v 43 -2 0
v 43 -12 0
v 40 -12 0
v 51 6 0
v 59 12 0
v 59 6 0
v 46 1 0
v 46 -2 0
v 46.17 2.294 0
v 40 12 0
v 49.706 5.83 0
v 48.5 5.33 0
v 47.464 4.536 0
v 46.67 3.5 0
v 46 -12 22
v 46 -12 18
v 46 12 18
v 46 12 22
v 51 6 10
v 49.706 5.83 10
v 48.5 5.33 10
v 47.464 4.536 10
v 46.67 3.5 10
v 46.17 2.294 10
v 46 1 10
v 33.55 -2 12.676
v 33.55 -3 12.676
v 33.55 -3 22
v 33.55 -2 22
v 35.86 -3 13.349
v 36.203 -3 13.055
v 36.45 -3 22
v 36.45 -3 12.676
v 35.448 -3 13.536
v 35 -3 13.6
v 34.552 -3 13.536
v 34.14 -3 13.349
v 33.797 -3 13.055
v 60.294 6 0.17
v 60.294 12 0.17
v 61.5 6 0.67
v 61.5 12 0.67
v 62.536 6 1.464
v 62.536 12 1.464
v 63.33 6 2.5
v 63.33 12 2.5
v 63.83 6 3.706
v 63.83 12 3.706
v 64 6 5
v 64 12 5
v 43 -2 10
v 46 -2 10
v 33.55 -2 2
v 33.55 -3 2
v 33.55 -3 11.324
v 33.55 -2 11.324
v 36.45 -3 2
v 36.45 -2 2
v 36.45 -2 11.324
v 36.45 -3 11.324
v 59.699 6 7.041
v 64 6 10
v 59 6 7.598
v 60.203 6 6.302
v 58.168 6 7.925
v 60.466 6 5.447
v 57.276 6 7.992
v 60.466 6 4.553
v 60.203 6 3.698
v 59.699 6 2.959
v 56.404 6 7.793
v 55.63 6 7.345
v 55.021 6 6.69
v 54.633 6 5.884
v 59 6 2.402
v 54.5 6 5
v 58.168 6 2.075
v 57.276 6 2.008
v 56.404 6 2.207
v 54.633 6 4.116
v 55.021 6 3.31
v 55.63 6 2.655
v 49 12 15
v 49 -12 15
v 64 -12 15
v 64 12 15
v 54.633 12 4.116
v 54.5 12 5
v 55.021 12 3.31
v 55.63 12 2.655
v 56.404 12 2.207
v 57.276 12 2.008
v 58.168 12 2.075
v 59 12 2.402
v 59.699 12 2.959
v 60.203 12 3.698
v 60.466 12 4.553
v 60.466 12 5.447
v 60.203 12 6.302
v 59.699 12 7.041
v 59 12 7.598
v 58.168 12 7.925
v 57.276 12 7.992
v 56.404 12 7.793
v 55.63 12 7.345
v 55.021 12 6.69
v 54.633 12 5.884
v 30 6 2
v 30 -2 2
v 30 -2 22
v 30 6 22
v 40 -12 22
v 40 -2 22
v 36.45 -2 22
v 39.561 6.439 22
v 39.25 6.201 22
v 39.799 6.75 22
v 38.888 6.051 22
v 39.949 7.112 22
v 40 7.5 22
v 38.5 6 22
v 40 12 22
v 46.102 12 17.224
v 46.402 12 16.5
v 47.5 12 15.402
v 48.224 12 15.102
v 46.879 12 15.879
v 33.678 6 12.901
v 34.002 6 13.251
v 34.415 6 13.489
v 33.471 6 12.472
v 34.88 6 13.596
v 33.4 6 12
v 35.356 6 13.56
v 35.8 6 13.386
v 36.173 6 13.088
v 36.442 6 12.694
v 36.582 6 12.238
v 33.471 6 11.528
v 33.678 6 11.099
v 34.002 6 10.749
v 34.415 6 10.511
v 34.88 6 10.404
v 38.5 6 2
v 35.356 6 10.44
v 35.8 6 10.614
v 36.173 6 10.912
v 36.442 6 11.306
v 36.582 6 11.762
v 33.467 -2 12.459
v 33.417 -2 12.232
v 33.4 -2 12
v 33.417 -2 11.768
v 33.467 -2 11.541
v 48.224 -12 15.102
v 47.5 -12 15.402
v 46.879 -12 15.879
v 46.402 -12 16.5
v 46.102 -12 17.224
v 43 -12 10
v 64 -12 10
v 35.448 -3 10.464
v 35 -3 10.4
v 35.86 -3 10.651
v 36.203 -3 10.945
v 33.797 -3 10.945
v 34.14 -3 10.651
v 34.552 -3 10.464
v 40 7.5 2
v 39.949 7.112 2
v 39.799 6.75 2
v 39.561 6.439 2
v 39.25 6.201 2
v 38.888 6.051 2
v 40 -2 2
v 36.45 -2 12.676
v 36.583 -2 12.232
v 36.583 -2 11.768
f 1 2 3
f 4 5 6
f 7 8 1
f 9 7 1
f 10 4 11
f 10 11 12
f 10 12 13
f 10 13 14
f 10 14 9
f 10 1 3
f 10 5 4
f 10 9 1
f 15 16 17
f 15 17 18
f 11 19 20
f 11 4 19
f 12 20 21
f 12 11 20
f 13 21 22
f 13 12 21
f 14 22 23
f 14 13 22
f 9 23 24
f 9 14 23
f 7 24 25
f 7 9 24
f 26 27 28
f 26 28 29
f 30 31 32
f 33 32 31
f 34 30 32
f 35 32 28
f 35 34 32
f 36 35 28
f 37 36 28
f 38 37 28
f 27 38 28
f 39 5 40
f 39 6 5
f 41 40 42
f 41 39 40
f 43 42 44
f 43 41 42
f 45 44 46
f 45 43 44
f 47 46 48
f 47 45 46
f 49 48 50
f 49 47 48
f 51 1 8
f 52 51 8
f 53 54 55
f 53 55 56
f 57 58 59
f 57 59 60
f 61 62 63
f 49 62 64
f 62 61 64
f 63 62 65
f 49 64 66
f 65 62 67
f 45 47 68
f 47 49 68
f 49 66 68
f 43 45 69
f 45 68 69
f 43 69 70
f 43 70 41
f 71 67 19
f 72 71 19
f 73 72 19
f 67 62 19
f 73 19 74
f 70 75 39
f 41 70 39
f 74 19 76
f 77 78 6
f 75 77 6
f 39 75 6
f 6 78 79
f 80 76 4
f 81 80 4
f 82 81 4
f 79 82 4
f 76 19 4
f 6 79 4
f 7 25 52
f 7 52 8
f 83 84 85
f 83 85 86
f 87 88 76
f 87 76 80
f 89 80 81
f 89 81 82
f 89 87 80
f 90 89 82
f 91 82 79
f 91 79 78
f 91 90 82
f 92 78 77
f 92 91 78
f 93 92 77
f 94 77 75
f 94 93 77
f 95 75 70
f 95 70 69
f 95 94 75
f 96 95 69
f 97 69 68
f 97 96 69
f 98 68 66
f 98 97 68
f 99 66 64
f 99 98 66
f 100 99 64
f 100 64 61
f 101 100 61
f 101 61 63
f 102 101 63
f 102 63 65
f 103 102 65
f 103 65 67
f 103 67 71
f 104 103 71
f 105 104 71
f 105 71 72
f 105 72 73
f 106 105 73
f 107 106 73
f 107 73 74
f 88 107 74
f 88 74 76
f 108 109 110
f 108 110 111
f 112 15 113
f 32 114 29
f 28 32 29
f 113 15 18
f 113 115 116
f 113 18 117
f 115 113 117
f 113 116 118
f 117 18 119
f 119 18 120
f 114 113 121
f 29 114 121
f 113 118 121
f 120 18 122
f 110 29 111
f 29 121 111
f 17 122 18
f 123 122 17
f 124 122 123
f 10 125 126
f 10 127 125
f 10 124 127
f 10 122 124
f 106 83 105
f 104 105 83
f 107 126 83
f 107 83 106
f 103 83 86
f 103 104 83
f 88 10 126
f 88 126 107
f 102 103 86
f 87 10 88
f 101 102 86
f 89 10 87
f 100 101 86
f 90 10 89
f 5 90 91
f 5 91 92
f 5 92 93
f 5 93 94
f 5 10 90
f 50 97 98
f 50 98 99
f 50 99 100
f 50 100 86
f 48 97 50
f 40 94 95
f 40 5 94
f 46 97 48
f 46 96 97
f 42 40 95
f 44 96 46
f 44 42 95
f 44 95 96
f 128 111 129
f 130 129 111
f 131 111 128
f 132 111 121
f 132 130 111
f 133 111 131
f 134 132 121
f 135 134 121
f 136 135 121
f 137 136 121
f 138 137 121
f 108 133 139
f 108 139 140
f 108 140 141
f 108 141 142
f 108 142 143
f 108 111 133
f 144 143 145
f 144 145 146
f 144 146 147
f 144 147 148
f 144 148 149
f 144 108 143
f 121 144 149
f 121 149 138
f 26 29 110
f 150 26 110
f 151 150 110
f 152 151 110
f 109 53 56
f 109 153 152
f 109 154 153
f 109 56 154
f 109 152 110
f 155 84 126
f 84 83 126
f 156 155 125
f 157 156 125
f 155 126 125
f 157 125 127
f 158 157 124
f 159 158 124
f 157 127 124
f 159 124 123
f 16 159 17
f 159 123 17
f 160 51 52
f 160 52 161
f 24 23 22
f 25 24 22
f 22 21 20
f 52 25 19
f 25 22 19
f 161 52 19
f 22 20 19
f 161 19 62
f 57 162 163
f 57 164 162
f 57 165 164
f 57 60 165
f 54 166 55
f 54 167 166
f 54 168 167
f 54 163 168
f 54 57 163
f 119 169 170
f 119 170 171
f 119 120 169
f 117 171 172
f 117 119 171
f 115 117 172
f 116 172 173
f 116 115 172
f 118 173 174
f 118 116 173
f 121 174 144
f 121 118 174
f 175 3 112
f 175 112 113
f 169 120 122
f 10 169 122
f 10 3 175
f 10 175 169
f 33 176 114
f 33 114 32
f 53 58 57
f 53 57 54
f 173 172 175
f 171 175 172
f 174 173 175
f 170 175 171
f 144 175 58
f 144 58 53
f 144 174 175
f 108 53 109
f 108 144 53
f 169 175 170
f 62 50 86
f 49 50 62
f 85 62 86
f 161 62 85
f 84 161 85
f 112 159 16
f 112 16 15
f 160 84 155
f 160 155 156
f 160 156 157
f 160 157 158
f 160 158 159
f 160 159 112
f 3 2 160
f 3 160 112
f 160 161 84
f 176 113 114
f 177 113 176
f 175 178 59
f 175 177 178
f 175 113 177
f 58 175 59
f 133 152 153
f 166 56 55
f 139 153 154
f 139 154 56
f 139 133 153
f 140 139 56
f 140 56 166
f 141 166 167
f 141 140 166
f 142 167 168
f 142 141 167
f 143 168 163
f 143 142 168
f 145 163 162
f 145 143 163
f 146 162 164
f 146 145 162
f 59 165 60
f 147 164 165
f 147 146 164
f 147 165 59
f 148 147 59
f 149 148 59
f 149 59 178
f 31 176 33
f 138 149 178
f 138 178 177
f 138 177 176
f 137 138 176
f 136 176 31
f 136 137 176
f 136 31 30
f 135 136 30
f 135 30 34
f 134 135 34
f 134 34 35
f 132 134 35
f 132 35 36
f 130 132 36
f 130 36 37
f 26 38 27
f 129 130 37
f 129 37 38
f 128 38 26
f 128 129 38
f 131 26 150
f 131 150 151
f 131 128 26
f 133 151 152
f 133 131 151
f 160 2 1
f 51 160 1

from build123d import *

# Parameters (mm, degrees)
MAIN_DEPTH                   = 22
ESQUISSE2_W                  = 10
ESQUISSE2_H                  = 8
ENL_V_MAT_EXTRU_1_DEPTH      = 19
ESQUISSE3_W                  = 21
ESQUISSE3_H                  = 10
ENL_V_MAT_EXTRU_2_DEPTH      = 10
ESQUISSE4_R                  = 3
ENL_V_MAT_EXTRU_3_DEPTH      = 1
ENL_V_MAT_EXTRU_3_DEPTH_BACK = 25
CONG_2_R                     = 5
ENL_V_START                  = -18
ESQUISSE6_W                  = 7
ESQUISSE6_H                  = 24
ENL_V_MAT_EXTRU_4_DEPTH      = 18
SKETCH1_W                    = 10
SKETCH1_H                    = 2
CUT_EXTRUDE1_DEPTH           = 19
SKETCH2_R                    = 1.6
CUT_EXTRUDE2_DEPTH           = 19
FILLET1_R                    = 1.5
CONG_3_R                     = 3
SKETCH3_W                    = 22
SKETCH3_H                    = 24
CUT_EXTRUDE3_DEPTH           = 39


with BuildPart() as part:
    # Esquisse1 → Main (new body)
    with BuildSketch(Plane.XY):
        Polygon((-12, -12), (12, -12), (12, -2), (15.55, -2), (15.55, -3), (18.45, -3), (18.45, -2), (22, -2), (22, 6), (12, 6), (12, 12), (-12, 12), align=None)
    extrude(amount=MAIN_DEPTH)

    # Esquisse2 → Enlèv. mat.-Extru.1 (cut, through all)
    with BuildSketch(Plane(origin=(6, 0, 0), x_dir=(0, 0, -1), z_dir=(1, 0, 0))):
        with Locations((-5, 2)):
            Rectangle(ESQUISSE2_W, ESQUISSE2_H)
    extrude(amount=-ENL_V_MAT_EXTRU_1_DEPTH, mode=Mode.SUBTRACT)

    # Esquisse3 → Enlèv. mat.-Extru.2 (cut)
    with BuildSketch(Plane(origin=(0, 0, 0), x_dir=(-1, 0, 0), z_dir=(0, 0, -1))):
        with Locations((1.5, -7)):
            Rectangle(ESQUISSE3_W, ESQUISSE3_H)
    extrude(amount=-ENL_V_MAT_EXTRU_2_DEPTH, mode=Mode.SUBTRACT)

    # Esquisse4 → Enlèv. mat.-Extru.3 (cut, two sides)
    with BuildSketch(Plane(origin=(0, 12, 0), x_dir=(1, 0, 0), z_dir=(0, 1, 0))) as enl_v_mat_extru_3_sk:
        with Locations((-5.5, -5)):
            Circle(ESQUISSE4_R)
    extrude(amount=ENL_V_MAT_EXTRU_3_DEPTH, mode=Mode.SUBTRACT)
    extrude(enl_v_mat_extru_3_sk.sketch, amount=-ENL_V_MAT_EXTRU_3_DEPTH_BACK, mode=Mode.SUBTRACT)

    # Congé2
    cong_2_edges = [part.edges().sort_by_distance(p)[0] for p in [
        (-12, 9, 0),
        (6, 6, 5),
    ]]
    fillet(cong_2_edges, radius=CONG_2_R)

    # Esquisse6 → Enlèv. mat.-Extru.4 (cut)
    with BuildSketch(Plane.ZY.offset(12).offset(ENL_V_START)):
        with Locations((18.5, 0)):
            Rectangle(ESQUISSE6_W, ESQUISSE6_H)
    extrude(amount=ENL_V_MAT_EXTRU_4_DEPTH, mode=Mode.SUBTRACT)

    # Sketch1 → Cut-Extrude1 (cut, through all)
    with BuildSketch(Plane(origin=(0, 6, 0), x_dir=(1, 0, 0), z_dir=(0, 1, 0))):
        with Locations((17, -1)):
            Rectangle(SKETCH1_W, SKETCH1_H)
    extrude(amount=-CUT_EXTRUDE1_DEPTH, mode=Mode.SUBTRACT)

    # Sketch2 → Cut-Extrude2 (cut, through all)
    with BuildSketch(Plane(origin=(0, 6, 0), x_dir=(1, 0, 0), z_dir=(0, 1, 0))):
        with Locations((17, -12)):
            Circle(SKETCH2_R)
    extrude(amount=-CUT_EXTRUDE2_DEPTH, mode=Mode.SUBTRACT)

    # Fillet1
    fillet1_edges = [part.edges().sort_by_distance(p)[0] for p in [
        (12, 6, 12),
    ]]
    fillet(fillet1_edges, radius=FILLET1_R)

    # Congé3
    cong_3_edges = [part.edges().sort_by_distance(p)[0] for p in [
        (6, 0, 15),
    ]]
    fillet(cong_3_edges, radius=CONG_3_R)


with BuildPart() as body_2:
    # Mirror1: mirrored copy
    add(part.part.mirror(Plane(origin=(26, 0, 0), x_dir=(0, 0, 1), z_dir=(1, 0, 0))))


with BuildPart() as part_1:
    add(part.part)

    # Sketch3 → Cut-Extrude3 (cut, through all)
    with BuildSketch(Plane(origin=(26, 0, 0), x_dir=(0, 0, -1), z_dir=(1, 0, 0))):
        with Locations((-11, 0)):
            Rectangle(SKETCH3_W, SKETCH3_H)
    extrude(amount=-CUT_EXTRUDE3_DEPTH, mode=Mode.SUBTRACT)


solid = body_2.part
